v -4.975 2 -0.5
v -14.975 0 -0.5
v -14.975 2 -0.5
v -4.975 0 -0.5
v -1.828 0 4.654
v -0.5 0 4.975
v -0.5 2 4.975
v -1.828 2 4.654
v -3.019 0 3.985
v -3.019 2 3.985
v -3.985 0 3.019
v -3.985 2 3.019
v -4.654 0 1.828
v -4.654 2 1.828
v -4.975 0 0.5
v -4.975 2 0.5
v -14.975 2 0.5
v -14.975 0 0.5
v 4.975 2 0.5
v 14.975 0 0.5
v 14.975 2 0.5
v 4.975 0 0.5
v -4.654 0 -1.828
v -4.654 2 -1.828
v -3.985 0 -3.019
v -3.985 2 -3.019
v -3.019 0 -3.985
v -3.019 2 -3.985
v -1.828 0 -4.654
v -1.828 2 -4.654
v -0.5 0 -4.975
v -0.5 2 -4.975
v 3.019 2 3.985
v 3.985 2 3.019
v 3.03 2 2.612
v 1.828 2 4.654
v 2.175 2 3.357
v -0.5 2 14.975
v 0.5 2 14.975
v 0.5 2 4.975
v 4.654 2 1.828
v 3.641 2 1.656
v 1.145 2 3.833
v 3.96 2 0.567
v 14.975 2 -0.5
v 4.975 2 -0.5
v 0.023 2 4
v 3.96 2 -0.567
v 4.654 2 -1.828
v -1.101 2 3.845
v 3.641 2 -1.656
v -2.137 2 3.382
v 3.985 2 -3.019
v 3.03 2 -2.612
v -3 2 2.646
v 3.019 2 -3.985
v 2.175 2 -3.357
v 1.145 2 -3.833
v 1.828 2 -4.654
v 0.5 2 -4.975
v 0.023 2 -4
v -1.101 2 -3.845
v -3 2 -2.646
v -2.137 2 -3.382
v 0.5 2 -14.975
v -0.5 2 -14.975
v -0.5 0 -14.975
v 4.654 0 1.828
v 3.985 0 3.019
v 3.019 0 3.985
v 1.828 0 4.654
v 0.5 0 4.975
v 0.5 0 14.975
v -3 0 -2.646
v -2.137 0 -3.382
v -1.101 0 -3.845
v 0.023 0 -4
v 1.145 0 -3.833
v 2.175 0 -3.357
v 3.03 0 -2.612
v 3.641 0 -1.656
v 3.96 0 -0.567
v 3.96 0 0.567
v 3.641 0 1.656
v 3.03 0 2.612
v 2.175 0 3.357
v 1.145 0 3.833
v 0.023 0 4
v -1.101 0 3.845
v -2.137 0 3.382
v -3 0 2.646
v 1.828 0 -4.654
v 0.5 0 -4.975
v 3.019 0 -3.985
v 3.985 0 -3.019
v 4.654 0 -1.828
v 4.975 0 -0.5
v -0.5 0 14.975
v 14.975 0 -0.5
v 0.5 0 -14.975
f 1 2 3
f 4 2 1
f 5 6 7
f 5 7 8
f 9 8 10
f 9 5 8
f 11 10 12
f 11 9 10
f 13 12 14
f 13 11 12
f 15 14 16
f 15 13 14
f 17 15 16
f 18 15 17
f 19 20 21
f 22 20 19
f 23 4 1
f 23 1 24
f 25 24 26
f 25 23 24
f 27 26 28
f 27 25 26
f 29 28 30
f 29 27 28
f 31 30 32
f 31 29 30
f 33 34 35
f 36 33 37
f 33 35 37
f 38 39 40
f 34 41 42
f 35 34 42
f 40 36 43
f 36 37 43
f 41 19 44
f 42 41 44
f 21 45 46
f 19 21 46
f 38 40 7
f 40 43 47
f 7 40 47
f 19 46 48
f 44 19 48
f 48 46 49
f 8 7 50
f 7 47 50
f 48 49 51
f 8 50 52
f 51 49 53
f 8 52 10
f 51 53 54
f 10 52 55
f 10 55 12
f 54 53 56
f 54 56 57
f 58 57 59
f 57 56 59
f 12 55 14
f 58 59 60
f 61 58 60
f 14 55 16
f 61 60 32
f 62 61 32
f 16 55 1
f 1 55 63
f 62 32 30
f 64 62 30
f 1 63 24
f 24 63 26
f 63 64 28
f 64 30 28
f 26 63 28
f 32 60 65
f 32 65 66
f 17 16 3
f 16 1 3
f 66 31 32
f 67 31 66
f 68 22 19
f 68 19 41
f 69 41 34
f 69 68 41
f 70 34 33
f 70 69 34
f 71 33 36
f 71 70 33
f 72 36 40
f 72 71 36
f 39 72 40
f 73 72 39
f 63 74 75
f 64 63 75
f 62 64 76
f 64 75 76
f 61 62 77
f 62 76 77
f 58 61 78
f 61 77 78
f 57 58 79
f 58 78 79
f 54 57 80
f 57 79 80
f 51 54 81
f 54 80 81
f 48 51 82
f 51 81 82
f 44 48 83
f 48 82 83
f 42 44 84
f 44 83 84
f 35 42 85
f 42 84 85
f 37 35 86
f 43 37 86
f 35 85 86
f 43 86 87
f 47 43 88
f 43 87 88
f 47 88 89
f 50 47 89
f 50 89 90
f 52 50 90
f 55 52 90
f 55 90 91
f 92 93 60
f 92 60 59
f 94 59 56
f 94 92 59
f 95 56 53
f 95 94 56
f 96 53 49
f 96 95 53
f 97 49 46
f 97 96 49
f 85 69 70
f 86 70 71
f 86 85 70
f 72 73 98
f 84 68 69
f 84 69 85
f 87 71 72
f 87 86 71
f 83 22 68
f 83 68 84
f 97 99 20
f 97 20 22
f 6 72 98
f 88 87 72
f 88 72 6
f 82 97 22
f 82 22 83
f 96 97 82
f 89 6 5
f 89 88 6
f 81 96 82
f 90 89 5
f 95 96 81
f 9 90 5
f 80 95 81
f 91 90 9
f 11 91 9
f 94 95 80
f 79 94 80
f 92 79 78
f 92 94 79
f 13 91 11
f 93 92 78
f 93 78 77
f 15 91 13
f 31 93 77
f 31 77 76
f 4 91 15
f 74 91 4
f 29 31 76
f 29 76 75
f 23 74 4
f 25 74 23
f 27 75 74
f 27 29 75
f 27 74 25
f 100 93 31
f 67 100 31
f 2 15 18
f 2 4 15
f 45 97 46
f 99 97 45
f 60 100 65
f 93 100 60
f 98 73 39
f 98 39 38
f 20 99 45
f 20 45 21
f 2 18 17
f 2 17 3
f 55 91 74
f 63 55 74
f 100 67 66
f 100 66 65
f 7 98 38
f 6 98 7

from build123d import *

# Parameters (mm, degrees)
BOSS_EXTRUDE1_DEPTH     = 2
CUT_EXTRUDE1_DEPTH      = 22.271988328
CUT_EXTRUDE1_DEPTH_BACK = 22.271988328


with BuildPart() as part:
    # Sketch1 → Boss-Extrude1 (new body)
    with BuildSketch(Plane(origin=(0, 0, 0), x_dir=(1, 0, 0), z_dir=(0, 1, 0))):
        with BuildLine():
            Line((-0.5, 4.974937186), (-0.5, 14.974937186))
            Line((-0.5, 14.974937186), (0.5, 14.974937186))
            Line((0.5, 14.974937186), (0.5, 4.974937186))
            ThreePointArc((0.5, 4.974937186), (3.535533906, 3.535533906), (4.974937186, 0.5))
            Line((4.974937186, 0.5), (14.974937186, 0.5))
            Line((14.974937186, 0.5), (14.974937186, -0.5))
            Line((14.974937186, -0.5), (4.974937186, -0.5))
            ThreePointArc((4.974937186, -0.5), (3.535533906, -3.535533906), (0.5, -4.974937186))
            Line((0.5, -4.974937186), (0.5, -14.974937186))
            Line((0.5, -14.974937186), (-0.5, -14.974937186))
            Line((-0.5, -14.974937186), (-0.5, -4.974937186))
            ThreePointArc((-0.5, -4.974937186), (-3.535533906, -3.535533906), (-4.974937186, -0.5))
            Line((-4.974937186, -0.5), (-14.974937186, -0.5))
            Line((-14.974937186, -0.5), (-14.974937186, 0.5))
            Line((-14.974937186, 0.5), (-4.974937186, 0.5))
            ThreePointArc((-4.974937186, 0.5), (-3.535533906, 3.535533906), (-0.5, 4.974937186))
        make_face()
    extrude(amount=BOSS_EXTRUDE1_DEPTH)

    # Sketch2 → Cut-Extrude1 (cut, two sides: drawn at the far end of the back side and taken through both)
    with BuildSketch(Plane(origin=(0, 0, 0), x_dir=(1, 0, 0), z_dir=(0, 1, 0)).offset(-CUT_EXTRUDE1_DEPTH_BACK)):
        with BuildLine():
            Line((-3, -2.645751311), (-3, 2.645751311))
            ThreePointArc((-3, 2.645751311), (4, 0), (-3, -2.645751311))
        make_face()
    extrude(amount=CUT_EXTRUDE1_DEPTH + CUT_EXTRUDE1_DEPTH_BACK, mode=Mode.SUBTRACT)


solid = part.part
